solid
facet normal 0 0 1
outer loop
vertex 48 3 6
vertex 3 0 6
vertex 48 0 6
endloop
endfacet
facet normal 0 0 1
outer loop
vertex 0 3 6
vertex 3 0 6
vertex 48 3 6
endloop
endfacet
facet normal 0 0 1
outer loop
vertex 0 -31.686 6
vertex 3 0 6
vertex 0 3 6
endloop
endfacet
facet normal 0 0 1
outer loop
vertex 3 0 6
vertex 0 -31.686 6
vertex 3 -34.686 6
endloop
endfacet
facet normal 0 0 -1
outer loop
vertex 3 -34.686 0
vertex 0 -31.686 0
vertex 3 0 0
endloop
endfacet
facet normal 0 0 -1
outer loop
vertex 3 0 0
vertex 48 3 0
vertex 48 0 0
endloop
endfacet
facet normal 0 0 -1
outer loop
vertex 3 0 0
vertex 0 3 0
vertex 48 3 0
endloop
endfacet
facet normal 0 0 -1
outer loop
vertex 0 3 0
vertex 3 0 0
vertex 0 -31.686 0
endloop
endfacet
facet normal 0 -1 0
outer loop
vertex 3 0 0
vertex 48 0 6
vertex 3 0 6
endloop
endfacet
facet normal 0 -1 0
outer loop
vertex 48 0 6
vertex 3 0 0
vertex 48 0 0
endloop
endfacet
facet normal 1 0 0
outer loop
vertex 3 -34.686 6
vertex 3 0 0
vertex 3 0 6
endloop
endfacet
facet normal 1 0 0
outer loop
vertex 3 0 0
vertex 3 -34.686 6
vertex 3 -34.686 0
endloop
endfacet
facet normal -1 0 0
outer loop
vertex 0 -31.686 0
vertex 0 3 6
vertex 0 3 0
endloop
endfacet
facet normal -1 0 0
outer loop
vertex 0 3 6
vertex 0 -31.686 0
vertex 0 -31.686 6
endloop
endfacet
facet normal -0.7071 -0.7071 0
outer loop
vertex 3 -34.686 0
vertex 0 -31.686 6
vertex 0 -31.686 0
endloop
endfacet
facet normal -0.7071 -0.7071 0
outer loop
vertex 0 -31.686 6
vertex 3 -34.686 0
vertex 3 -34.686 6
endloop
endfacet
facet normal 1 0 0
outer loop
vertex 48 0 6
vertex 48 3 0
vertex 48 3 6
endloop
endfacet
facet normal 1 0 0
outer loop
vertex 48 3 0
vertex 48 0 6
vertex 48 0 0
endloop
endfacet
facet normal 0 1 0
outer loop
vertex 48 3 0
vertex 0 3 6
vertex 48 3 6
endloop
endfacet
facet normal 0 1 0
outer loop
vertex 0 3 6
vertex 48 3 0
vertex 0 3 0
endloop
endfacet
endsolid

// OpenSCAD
/********************************************************************
 * TinkerLib : Modified latch pin for Thing #4592 (incomplete)
 * https://github.com/tinkerology/tinkerlib
 * By Scott P Leslie (https://twitter.com/tinkerology)
 * Licensed Under Creative Commons Attributions Share Alike 
 * (http://creativecommons.org/licenses/by-sa/3.0/deed.en_US)
 *******************************************************************/

module drawLatchPinAndSpring()
{
	cube([48,3,6]);

	difference()
	{
		color("blue")
		rotate(-90)
		cube([35,3,6]);

		color("green")
		rotate(-90)
		translate([35,-8,0])
		rotate(45)
		cube([8,8,8]);
	}
}

drawLatchPinAndSpring();
